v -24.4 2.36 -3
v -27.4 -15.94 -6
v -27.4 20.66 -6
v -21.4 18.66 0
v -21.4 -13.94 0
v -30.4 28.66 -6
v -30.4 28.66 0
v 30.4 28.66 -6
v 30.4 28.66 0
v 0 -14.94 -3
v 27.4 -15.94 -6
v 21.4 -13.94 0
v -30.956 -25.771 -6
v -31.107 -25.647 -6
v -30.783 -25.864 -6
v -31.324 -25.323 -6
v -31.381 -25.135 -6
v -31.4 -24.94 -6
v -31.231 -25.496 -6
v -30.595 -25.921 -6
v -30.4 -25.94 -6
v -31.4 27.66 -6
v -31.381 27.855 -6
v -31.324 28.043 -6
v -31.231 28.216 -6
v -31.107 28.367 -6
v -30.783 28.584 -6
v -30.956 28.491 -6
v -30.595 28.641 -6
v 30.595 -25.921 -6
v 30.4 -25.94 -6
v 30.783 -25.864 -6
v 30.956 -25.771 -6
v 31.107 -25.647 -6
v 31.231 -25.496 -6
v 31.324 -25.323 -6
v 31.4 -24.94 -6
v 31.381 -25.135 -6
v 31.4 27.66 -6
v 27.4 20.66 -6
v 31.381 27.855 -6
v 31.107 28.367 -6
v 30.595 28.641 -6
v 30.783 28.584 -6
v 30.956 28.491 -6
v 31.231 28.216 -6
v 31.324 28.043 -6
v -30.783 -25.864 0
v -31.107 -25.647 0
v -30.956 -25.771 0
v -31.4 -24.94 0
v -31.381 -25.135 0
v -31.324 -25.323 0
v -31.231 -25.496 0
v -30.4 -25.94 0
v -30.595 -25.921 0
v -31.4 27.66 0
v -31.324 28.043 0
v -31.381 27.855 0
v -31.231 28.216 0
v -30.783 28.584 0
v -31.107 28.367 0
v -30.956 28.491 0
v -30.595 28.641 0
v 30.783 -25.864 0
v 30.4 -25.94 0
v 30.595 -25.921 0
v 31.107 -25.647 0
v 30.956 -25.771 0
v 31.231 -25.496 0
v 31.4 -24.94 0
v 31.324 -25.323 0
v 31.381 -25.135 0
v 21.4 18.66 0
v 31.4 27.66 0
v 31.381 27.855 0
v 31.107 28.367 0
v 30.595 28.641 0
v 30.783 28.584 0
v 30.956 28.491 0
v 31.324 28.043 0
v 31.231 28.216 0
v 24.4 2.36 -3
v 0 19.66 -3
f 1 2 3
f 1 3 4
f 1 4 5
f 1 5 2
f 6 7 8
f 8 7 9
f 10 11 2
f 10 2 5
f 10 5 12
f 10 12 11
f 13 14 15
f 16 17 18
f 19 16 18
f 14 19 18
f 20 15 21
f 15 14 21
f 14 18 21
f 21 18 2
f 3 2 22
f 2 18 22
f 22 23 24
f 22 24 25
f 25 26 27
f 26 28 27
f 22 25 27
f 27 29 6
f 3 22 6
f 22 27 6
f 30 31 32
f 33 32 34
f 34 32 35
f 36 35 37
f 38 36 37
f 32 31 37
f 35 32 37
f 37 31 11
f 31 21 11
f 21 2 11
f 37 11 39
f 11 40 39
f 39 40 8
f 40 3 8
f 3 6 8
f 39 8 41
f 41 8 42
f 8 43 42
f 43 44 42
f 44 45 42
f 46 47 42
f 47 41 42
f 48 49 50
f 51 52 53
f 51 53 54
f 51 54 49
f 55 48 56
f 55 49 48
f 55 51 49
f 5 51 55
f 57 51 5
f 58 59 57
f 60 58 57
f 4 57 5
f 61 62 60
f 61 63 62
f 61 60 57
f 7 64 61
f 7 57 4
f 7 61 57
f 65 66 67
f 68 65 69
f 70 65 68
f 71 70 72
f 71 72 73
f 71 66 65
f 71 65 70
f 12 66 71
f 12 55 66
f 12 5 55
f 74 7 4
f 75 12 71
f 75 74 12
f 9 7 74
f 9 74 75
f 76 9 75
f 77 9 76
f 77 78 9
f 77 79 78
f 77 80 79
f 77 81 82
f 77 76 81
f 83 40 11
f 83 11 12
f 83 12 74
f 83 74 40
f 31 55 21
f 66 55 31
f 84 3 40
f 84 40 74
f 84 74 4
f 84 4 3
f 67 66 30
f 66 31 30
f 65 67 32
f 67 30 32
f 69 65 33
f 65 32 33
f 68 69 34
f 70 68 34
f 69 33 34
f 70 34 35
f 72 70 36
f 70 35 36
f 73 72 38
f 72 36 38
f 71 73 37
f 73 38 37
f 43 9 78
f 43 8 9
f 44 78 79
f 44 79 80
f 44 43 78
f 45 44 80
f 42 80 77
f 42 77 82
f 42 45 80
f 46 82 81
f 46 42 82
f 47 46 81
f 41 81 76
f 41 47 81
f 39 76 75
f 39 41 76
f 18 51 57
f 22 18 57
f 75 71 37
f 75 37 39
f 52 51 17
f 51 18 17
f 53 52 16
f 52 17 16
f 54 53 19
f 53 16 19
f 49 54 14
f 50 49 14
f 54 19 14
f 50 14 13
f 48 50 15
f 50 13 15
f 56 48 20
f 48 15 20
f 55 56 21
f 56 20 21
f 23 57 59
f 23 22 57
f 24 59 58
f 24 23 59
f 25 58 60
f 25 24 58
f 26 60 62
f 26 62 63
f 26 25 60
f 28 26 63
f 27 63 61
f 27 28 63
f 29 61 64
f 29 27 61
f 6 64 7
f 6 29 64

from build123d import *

# Parameters (mm, degrees)
SKETCH1_W           = 62.8
SKETCH1_H           = 54.6
SKETCH1_W_2         = 42.8
SKETCH1_H_2         = 32.6
BOSS_EXTRUDE1_DEPTH = 6
FILLET1_R           = 1


with BuildPart() as part:
    # Sketch1 → Boss-Extrude1 (new body)
    with BuildSketch(Plane.XY):
        with Locations((0, 1.36)):
            Rectangle(SKETCH1_W, SKETCH1_H)
        with Locations((0, 2.36)):
            Rectangle(SKETCH1_W_2, SKETCH1_H_2, mode=Mode.SUBTRACT)
    extrude(amount=-BOSS_EXTRUDE1_DEPTH)

    # Cut-Loft3: read off the stored shape, not the designer's step
    # Cut-Loft3: loft between two sections, ruled curve by curve
    cut_loft3_from = [
        Edge.make_line((-27.4, -15.94, -6), (-27.4, 20.66, -6)),
        Edge.make_line((-27.4, 20.66, -6), (27.4, 20.66, -6)),
        Edge.make_line((27.4, -15.94, -6), (-27.4, -15.94, -6)),
        Edge.make_line((27.4, 20.66, -6), (27.4, -15.94, -6)),
    ]
    cut_loft3_to = [
        Edge.make_line((-21.4, -13.94, 0), (-21.4, 18.66, 0)),
        Edge.make_line((-21.4, 18.66, 0), (21.4, 18.66, 0)),
        Edge.make_line((21.4, -13.94, 0), (-21.4, -13.94, 0)),
        Edge.make_line((21.4, 18.66, 0), (21.4, -13.94, 0)),
    ]
    cut_loft3 = Solid(Shell([*[Face.make_surface_from_curves(cut_loft3_from[k], cut_loft3_to[k]) for k in range(4)], Face(Wire(cut_loft3_from)), Face(Wire(cut_loft3_to))]))
    add(cut_loft3, mode=Mode.SUBTRACT)

    # Fillet1
    fillet1_edges = [part.edges().sort_by_distance(p)[0] for p in [
        (-31.4, -25.94, -3),
        (-31.4, 28.66, -3),
        (31.4, 28.66, -3),
        (31.4, -25.94, -3),
    ]]
    fillet(fillet1_edges, radius=FILLET1_R)


solid = part.part
